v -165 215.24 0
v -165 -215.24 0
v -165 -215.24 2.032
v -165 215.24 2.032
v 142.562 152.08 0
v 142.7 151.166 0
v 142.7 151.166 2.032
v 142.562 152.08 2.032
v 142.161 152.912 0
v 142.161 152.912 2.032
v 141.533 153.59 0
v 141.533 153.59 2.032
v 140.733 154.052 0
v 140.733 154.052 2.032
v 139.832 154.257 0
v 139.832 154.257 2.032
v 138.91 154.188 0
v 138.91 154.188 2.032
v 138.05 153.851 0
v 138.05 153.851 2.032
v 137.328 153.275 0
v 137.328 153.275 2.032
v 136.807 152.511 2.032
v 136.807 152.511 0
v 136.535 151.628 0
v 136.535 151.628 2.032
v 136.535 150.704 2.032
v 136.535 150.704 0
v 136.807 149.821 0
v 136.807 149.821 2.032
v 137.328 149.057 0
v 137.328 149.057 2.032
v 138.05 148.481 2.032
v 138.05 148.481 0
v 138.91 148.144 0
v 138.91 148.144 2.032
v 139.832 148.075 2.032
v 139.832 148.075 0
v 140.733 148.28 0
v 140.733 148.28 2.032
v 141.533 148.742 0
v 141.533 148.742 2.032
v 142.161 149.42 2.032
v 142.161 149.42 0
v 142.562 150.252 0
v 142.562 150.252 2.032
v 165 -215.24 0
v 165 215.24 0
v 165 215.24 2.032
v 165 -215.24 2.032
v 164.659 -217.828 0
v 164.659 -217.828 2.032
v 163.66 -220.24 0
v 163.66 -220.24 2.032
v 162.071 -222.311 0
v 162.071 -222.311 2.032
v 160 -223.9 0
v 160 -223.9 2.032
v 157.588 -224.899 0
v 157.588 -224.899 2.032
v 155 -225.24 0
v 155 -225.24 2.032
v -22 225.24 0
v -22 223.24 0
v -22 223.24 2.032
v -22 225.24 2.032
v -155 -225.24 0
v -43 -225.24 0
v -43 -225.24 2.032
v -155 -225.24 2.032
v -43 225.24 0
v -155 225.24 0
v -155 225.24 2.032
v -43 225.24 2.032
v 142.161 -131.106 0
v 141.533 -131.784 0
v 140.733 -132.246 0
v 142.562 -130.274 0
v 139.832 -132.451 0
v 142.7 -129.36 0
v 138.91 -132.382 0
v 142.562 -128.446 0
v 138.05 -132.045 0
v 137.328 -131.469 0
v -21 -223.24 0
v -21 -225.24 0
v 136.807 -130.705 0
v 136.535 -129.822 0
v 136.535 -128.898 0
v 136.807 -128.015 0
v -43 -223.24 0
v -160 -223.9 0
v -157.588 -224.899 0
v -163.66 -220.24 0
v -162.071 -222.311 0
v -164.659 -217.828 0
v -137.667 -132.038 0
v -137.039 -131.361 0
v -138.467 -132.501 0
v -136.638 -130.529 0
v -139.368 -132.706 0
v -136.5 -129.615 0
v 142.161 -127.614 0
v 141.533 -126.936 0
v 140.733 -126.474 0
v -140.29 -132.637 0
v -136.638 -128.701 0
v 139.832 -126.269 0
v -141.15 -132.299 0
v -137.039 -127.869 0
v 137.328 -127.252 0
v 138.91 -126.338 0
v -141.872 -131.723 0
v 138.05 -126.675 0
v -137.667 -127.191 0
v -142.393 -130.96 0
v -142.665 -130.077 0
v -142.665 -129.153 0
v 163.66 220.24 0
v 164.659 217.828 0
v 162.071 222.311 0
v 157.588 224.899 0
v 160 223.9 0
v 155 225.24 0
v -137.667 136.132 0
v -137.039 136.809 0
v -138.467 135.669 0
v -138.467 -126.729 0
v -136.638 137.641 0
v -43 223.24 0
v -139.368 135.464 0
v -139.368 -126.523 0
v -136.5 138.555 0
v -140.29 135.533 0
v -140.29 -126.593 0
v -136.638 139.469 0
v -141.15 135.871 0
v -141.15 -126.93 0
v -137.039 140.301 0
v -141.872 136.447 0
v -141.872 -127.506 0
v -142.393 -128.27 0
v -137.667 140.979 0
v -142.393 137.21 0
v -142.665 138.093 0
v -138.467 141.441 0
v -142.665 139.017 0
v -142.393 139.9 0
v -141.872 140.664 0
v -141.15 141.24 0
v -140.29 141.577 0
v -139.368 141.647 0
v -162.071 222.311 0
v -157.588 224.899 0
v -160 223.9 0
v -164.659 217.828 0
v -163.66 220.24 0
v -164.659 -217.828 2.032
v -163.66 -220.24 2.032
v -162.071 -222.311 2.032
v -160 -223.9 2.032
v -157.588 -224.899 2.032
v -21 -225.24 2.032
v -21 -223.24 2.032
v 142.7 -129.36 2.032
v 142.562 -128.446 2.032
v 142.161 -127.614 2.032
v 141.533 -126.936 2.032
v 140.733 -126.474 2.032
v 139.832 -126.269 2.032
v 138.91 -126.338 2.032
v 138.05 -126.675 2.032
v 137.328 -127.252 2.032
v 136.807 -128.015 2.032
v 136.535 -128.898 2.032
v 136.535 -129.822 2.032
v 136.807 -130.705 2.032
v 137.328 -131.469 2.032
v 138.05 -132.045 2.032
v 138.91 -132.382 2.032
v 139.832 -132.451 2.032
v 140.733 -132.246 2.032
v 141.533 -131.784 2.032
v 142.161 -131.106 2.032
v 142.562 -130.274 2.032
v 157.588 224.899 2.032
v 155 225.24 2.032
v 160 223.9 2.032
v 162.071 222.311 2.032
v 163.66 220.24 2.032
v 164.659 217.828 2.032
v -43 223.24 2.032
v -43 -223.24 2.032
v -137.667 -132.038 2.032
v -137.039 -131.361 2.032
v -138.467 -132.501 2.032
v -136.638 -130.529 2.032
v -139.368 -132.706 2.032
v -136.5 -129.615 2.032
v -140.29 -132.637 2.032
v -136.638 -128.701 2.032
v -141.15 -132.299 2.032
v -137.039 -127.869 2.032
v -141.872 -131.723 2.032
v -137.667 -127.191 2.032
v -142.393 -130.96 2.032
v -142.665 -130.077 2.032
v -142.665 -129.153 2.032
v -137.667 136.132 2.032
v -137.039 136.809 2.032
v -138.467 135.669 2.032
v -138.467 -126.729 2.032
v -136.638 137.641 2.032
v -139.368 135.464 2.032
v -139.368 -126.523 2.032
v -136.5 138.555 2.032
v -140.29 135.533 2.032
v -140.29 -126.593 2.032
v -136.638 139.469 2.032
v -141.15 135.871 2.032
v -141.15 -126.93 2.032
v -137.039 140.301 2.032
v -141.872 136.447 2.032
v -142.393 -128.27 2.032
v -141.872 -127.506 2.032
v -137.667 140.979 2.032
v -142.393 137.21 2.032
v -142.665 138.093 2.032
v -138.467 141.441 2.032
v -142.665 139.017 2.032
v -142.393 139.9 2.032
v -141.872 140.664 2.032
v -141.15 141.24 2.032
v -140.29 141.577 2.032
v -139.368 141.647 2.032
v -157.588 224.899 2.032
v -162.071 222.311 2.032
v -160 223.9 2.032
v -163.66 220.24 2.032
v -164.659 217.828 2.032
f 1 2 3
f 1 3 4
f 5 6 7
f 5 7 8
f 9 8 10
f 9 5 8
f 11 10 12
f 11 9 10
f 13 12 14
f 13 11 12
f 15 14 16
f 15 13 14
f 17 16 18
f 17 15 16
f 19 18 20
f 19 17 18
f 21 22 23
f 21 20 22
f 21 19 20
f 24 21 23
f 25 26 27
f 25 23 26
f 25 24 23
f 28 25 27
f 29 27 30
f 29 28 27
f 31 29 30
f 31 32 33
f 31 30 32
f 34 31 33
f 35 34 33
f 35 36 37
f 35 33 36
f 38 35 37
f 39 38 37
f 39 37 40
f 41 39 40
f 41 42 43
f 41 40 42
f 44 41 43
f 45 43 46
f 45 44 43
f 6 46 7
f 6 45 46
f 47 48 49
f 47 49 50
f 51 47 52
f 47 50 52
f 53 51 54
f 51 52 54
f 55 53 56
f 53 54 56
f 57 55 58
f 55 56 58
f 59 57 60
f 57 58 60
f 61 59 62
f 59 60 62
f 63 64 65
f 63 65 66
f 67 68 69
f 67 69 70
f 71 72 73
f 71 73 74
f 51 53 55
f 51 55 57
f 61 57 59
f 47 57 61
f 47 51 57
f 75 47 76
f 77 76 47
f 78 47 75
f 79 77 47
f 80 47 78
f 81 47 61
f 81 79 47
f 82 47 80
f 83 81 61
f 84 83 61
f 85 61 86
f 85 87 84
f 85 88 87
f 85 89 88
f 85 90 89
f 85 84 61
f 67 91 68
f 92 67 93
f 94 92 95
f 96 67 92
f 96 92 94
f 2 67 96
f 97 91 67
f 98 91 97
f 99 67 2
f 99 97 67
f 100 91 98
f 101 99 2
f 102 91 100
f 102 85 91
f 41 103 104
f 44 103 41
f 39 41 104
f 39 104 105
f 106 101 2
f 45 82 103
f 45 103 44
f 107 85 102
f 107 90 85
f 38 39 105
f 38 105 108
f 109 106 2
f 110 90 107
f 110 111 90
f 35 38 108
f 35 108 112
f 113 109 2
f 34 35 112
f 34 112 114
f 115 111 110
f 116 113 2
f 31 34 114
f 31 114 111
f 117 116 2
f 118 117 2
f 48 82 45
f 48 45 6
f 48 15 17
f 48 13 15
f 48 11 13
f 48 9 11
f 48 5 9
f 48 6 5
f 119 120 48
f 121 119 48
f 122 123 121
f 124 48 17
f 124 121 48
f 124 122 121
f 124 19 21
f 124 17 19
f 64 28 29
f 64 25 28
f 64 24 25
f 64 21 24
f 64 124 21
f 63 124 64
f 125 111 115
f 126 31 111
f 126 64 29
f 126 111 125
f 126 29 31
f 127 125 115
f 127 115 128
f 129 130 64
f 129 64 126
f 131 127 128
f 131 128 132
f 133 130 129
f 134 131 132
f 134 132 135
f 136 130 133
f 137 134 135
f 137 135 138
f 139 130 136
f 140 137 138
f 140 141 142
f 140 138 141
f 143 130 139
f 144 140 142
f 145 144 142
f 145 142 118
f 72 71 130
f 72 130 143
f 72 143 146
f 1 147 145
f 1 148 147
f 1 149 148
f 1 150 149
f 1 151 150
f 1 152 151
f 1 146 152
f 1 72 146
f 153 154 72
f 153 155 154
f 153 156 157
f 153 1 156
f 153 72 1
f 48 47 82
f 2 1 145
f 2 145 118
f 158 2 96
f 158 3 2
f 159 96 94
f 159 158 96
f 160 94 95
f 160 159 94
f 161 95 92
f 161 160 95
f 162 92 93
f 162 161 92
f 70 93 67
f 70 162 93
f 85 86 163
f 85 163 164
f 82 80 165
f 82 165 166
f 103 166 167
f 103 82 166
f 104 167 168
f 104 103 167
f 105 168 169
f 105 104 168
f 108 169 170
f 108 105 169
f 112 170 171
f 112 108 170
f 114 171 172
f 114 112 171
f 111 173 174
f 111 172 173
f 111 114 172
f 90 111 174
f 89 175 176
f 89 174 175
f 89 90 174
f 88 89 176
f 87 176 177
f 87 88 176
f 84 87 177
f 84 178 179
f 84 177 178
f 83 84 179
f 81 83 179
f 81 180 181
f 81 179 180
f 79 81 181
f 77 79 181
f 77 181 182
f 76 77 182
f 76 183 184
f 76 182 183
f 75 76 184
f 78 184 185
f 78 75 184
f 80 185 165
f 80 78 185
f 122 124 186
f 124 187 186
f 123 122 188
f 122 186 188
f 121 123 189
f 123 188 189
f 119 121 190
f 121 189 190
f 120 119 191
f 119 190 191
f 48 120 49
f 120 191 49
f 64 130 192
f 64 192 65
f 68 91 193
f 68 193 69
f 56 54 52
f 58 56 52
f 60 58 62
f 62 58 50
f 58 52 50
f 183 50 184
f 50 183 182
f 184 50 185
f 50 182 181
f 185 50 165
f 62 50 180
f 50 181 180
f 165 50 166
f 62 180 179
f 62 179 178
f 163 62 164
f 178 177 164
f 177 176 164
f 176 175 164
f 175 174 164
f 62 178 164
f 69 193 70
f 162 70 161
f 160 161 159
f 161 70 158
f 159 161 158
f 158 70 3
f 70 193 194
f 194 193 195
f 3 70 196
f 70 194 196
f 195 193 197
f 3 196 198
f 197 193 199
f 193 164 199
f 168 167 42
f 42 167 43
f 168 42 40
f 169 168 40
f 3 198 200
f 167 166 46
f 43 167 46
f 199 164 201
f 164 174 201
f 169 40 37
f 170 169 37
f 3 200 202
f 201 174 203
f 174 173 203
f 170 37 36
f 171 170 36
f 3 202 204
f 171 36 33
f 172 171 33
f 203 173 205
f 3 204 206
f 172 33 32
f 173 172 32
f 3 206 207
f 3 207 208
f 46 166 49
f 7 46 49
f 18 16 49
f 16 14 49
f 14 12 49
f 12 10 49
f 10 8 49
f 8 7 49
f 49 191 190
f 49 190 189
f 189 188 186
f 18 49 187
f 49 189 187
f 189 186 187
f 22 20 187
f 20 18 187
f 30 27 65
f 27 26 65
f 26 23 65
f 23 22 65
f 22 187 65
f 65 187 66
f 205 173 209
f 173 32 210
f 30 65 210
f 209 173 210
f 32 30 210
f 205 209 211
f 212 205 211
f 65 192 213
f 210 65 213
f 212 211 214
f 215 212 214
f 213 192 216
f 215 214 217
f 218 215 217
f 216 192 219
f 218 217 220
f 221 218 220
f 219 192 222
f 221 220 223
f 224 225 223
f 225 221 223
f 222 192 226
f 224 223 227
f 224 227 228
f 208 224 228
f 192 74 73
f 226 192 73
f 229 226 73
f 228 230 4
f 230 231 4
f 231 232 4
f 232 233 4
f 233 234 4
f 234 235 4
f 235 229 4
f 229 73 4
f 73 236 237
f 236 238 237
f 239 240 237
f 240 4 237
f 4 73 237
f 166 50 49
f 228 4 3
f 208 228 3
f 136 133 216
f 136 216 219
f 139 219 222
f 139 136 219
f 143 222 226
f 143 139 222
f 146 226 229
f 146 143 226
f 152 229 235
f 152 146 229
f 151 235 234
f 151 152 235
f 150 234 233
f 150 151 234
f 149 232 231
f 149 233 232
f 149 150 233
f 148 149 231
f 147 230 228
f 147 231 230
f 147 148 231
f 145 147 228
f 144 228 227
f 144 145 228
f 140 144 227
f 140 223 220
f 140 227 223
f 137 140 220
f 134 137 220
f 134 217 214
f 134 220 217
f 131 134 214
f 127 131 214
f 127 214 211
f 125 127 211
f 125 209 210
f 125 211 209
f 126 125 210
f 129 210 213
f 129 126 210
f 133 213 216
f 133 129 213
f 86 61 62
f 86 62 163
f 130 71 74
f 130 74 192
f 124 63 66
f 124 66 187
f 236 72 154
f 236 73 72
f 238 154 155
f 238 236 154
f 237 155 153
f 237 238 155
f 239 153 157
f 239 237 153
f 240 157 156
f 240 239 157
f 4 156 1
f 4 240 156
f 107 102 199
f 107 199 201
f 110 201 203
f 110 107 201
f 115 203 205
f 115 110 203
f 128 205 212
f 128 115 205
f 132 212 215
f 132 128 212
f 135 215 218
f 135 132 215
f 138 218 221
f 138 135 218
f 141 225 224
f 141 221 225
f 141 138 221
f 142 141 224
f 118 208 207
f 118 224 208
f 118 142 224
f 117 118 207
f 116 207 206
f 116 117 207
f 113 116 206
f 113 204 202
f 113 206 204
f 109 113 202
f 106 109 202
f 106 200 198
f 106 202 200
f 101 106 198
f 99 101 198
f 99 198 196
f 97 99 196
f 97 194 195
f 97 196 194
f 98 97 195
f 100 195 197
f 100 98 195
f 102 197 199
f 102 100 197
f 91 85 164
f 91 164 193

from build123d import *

# Parameters (mm, degrees)
BOSS_EXTRUDE1_DEPTH     = 2.032
CUT_EXTRUDE5_DEPTH      = 280.217095866
CUT_EXTRUDE5_DEPTH_BACK = 280.217095866
SKETCH7_R               = 3.1
FILLET4_R               = 10


with BuildPart() as part:
    # Sketch2 → Boss-Extrude1 (new body)
    with BuildSketch(Plane.XY):
        Polygon((-43, 225.24), (-43, 223.24), (-22, 223.24), (-22, 225.24), (165, 225.24), (165, -225.24), (-21, -225.24), (-21, -223.24), (-43, -223.24), (-43, -225.24), (-165, -225.24), (-165, 225.24), align=None)
    extrude(amount=BOSS_EXTRUDE1_DEPTH)

    # Sketch7 → Cut-Extrude5 (cut, two sides: drawn at the far end of the back side and taken through both)
    with BuildSketch(Plane.XY.offset(2.032).offset(-CUT_EXTRUDE5_DEPTH_BACK)):
        with Locations((-139.599996944, -129.61479672)):
            Circle(SKETCH7_R)
        with Locations((-139.599996944, 138.555201517)):
            Circle(SKETCH7_R)
        with Locations((139.600003056, 151.166005167)):
            Circle(SKETCH7_R)
        with Locations((139.600003056, -129.360049889)):
            Circle(SKETCH7_R)
    extrude(amount=CUT_EXTRUDE5_DEPTH + CUT_EXTRUDE5_DEPTH_BACK, mode=Mode.SUBTRACT)

    # Fillet4
    fillet4_edges = [part.edges().sort_by_distance(p)[0] for p in [
        (-165, -225.24, 1.016),
        (-165, 225.24, 1.016),
        (165, 225.24, 1.016),
        (165, -225.24, 1.016),
    ]]
    fillet(fillet4_edges, radius=FILLET4_R)


solid = part.part
